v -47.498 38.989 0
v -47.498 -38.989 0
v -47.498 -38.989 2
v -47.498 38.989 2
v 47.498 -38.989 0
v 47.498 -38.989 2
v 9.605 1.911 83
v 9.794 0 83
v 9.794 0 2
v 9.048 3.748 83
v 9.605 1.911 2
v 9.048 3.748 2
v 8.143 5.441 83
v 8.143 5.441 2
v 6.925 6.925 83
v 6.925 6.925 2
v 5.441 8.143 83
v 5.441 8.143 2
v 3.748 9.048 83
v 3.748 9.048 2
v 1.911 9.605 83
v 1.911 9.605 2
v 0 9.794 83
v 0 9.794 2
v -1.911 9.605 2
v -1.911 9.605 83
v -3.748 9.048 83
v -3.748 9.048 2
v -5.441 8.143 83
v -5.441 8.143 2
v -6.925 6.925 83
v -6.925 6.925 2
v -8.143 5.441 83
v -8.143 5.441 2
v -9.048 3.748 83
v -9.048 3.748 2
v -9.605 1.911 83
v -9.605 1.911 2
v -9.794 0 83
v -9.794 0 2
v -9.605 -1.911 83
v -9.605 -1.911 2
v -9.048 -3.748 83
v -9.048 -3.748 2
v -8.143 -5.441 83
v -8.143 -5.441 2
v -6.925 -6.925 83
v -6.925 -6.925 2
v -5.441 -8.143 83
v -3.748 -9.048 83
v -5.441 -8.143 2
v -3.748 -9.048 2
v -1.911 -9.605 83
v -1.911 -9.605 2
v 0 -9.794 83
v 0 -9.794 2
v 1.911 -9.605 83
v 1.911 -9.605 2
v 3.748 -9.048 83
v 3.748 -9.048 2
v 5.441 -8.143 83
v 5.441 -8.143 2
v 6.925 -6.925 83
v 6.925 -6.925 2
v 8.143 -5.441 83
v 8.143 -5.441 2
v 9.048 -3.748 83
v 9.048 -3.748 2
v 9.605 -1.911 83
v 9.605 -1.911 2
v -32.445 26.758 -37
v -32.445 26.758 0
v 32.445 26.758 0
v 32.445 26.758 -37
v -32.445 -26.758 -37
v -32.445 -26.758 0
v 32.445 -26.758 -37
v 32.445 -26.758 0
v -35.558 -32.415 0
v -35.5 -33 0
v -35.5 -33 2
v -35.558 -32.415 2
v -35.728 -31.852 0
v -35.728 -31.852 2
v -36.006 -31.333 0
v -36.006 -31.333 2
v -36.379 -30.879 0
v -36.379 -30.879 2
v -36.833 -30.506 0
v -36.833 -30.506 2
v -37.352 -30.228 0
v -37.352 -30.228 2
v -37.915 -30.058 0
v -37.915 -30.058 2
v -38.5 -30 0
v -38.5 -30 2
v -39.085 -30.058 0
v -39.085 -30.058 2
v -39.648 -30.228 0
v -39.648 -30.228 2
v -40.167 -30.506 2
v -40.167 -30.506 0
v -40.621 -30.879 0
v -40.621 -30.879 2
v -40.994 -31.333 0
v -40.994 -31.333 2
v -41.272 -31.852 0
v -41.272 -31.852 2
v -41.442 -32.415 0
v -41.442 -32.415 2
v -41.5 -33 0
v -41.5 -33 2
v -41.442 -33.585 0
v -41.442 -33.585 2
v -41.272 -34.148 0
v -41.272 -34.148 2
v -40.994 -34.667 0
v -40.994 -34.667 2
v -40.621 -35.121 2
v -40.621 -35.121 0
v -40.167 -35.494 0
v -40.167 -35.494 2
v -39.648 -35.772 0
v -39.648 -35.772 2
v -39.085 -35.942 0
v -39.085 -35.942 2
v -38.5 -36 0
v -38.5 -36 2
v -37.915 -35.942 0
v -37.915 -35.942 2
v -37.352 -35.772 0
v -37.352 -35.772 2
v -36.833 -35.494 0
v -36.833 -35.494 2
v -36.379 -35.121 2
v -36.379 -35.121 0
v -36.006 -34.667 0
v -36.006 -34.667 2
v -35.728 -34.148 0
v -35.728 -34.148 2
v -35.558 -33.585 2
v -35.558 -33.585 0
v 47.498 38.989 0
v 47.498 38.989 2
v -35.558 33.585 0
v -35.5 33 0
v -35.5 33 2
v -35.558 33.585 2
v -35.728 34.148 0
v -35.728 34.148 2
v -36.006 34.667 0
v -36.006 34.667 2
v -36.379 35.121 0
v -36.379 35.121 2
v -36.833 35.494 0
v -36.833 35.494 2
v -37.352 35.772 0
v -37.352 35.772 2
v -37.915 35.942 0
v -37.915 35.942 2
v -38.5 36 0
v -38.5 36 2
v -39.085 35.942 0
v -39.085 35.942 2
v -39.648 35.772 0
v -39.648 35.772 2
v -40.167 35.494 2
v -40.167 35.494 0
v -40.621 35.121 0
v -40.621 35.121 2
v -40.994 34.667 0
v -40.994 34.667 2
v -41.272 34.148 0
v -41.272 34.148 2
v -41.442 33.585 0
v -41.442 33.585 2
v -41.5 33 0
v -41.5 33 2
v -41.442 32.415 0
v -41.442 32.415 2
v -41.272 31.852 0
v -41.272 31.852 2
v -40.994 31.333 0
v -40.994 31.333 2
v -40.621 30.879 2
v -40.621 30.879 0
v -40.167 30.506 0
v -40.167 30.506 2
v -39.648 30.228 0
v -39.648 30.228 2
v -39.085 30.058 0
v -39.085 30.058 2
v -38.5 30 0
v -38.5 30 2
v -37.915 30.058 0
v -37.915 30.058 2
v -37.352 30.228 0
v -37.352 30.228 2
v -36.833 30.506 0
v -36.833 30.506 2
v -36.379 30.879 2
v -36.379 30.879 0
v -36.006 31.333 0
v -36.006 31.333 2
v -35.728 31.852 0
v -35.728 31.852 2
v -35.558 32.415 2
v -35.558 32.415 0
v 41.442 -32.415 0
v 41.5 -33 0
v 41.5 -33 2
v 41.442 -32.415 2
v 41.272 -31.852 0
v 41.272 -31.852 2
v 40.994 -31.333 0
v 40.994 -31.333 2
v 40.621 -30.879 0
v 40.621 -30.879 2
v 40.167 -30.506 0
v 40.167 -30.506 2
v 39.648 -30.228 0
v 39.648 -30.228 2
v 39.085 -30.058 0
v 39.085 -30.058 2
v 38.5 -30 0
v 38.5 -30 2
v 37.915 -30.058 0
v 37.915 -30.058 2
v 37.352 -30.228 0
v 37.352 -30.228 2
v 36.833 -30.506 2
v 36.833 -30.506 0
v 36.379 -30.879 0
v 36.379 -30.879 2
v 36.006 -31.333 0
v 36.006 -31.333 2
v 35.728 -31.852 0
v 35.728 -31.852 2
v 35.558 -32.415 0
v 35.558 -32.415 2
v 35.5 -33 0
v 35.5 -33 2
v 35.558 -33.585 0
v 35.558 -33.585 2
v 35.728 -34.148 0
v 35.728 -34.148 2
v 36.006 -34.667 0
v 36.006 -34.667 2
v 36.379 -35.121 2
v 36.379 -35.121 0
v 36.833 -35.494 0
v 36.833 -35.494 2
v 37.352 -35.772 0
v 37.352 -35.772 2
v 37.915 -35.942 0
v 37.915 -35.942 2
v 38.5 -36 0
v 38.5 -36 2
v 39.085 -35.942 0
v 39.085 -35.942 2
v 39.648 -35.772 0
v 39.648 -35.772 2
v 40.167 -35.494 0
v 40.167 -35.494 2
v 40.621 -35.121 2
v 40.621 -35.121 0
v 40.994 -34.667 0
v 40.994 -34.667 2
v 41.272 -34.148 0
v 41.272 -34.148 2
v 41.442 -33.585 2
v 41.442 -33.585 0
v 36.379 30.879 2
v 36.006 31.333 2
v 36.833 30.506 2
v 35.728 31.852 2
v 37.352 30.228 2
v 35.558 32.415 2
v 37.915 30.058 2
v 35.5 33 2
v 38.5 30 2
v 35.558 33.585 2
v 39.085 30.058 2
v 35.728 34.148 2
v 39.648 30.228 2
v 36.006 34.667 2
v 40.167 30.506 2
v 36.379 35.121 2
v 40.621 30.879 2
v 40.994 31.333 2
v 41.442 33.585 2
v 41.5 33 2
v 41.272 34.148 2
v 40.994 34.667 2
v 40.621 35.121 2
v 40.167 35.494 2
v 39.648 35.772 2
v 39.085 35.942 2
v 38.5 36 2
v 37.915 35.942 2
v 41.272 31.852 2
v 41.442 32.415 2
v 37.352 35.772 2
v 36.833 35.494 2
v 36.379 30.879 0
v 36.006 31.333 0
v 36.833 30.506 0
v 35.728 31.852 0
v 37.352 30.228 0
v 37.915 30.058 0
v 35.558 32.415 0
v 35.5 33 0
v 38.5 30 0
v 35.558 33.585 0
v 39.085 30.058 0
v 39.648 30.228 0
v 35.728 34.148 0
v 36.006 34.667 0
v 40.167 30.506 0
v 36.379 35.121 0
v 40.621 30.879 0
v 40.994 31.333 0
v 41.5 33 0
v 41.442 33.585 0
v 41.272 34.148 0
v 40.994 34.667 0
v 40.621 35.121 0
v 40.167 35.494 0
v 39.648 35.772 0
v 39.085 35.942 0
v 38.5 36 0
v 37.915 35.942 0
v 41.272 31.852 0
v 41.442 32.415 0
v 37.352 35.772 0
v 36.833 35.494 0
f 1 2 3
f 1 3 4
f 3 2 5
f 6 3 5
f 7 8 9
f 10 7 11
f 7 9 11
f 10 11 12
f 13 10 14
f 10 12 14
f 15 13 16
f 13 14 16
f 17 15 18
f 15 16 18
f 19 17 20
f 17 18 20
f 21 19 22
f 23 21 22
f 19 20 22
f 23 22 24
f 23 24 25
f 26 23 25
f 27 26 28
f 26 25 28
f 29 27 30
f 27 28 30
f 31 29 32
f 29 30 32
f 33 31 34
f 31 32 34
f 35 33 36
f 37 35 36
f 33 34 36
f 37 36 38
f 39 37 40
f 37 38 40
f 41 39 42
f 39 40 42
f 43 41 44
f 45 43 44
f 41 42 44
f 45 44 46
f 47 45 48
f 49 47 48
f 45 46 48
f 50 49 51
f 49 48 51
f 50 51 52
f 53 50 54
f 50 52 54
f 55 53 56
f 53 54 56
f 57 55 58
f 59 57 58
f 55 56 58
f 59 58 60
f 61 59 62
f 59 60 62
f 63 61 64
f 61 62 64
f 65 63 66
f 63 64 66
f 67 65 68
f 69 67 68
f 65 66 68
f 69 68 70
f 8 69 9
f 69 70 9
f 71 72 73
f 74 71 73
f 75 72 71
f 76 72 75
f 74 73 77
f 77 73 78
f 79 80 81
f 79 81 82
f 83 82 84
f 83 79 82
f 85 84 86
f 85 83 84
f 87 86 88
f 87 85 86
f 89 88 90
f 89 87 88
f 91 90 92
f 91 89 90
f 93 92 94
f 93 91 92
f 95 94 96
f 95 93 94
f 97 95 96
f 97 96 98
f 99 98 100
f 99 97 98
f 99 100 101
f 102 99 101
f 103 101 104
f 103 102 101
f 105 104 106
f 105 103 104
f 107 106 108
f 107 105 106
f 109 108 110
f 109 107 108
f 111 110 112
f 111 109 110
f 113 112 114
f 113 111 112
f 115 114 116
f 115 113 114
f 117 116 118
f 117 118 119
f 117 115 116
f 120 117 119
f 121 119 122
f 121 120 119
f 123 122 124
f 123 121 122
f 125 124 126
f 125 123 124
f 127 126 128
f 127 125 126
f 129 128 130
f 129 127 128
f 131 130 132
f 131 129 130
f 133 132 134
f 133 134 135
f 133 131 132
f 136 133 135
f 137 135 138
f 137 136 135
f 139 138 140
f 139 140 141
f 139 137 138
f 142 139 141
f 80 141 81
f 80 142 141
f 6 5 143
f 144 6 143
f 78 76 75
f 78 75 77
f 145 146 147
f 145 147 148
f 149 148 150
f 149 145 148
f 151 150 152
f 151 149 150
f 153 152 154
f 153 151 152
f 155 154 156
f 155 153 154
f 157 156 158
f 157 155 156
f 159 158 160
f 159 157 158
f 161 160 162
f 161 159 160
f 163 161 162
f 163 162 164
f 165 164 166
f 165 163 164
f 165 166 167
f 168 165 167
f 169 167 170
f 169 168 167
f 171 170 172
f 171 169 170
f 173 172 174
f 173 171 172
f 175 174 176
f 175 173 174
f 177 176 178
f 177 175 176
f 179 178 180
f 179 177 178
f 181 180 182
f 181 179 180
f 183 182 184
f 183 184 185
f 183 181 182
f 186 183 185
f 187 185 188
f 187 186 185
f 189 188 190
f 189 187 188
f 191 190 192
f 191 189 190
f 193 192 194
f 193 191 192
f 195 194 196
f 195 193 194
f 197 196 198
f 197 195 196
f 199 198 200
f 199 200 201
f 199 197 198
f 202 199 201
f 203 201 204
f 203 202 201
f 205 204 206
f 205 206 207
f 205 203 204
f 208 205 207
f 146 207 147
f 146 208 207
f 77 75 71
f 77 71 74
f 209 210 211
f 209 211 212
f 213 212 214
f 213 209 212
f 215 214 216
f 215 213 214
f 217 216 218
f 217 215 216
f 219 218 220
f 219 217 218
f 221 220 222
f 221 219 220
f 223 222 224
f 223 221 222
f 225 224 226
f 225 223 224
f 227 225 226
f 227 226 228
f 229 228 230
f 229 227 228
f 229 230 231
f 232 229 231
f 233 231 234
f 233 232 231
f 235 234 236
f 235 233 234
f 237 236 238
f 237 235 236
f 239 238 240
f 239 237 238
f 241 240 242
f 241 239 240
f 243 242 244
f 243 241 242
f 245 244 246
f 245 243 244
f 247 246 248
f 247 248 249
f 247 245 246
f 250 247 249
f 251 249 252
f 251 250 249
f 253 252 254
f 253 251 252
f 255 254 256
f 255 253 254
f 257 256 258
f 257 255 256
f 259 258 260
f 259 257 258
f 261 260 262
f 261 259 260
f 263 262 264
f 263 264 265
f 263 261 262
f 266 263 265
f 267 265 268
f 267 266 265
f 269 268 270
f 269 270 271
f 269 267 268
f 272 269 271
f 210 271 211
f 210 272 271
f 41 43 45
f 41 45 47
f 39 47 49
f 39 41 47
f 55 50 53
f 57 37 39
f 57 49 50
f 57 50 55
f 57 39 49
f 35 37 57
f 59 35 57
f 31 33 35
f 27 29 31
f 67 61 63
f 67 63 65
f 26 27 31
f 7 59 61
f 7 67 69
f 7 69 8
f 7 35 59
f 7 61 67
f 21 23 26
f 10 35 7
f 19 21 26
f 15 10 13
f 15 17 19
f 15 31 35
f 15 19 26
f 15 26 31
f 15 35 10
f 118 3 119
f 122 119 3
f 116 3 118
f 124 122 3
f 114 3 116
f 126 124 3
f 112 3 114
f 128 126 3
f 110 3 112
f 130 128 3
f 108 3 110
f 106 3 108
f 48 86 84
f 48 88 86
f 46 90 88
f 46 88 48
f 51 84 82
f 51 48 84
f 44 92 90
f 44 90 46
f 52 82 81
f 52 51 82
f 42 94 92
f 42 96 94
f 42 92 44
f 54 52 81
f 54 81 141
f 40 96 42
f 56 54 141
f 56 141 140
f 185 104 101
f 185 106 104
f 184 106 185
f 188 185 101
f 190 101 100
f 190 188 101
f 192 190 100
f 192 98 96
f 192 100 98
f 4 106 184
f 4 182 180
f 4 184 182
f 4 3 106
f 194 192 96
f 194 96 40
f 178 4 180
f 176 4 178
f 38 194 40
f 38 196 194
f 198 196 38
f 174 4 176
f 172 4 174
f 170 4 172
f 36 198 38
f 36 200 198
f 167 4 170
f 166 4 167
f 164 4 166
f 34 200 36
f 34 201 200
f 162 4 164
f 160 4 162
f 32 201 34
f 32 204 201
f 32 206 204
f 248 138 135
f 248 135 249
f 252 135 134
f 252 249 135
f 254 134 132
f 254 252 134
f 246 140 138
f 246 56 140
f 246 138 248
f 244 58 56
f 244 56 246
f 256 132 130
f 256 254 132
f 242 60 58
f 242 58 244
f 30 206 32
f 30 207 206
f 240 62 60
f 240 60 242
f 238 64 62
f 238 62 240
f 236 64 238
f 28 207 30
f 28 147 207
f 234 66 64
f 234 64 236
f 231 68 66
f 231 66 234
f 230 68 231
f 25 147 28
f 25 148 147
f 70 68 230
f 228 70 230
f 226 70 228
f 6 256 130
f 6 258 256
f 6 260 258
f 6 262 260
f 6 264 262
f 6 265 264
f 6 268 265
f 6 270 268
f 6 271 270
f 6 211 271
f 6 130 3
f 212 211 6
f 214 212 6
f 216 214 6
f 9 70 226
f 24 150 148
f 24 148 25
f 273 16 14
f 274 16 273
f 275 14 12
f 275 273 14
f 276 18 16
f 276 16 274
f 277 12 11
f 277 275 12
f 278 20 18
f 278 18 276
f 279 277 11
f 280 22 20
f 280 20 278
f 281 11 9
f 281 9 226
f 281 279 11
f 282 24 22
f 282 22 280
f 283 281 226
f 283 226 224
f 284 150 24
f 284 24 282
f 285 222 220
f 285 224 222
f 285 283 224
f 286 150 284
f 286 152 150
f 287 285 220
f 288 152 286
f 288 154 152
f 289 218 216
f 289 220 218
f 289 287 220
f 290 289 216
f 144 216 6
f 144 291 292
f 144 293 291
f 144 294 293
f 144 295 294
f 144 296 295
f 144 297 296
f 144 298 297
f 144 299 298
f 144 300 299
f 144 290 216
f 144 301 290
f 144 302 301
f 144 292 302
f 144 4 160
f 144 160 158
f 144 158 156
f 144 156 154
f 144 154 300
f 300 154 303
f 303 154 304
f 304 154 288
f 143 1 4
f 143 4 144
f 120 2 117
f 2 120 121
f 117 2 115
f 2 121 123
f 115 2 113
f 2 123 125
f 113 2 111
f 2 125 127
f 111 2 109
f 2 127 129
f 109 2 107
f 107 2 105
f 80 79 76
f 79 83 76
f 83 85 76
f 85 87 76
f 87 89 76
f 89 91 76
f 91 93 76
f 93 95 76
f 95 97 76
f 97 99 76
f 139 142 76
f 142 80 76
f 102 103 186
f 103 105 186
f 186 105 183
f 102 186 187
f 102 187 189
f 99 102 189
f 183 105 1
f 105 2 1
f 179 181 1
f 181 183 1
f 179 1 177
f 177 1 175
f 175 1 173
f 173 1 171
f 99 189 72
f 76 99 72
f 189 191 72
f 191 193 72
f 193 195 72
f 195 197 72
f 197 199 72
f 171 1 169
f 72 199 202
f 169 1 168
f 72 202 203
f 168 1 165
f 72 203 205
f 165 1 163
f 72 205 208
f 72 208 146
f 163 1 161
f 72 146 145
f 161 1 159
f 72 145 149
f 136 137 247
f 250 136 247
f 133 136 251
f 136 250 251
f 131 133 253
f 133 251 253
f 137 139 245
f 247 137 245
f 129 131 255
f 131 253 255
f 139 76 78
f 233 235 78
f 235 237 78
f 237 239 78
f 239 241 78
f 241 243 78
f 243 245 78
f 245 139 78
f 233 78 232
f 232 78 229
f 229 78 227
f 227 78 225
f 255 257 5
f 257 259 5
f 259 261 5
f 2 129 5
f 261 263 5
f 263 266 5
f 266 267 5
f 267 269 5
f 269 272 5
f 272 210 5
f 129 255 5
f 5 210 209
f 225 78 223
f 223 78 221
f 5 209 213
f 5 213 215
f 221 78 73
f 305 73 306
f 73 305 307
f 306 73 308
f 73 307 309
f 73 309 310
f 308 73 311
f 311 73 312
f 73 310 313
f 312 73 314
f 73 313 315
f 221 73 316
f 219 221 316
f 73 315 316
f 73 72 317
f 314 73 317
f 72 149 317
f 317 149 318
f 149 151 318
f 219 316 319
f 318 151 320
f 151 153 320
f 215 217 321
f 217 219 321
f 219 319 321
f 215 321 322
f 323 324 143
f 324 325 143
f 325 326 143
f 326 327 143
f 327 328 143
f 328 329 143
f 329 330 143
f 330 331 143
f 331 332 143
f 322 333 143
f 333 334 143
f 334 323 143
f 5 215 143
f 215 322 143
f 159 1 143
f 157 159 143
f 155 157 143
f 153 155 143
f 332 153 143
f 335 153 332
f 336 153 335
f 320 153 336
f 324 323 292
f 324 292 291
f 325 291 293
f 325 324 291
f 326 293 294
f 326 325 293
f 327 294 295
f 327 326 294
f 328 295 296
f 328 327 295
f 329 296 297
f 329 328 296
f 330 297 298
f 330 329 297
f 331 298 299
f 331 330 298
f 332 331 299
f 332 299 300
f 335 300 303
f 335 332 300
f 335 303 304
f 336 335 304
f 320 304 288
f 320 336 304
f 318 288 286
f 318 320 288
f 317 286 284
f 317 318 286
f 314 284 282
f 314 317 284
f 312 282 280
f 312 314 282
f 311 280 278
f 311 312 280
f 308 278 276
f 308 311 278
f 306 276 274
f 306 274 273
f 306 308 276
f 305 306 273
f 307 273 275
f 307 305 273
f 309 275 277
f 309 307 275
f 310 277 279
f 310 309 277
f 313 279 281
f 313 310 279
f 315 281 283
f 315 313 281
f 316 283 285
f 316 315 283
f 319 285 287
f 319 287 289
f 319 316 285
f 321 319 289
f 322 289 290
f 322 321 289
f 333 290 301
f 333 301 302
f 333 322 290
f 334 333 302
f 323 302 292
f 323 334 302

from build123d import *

# Parameters (mm, degrees)
F0_W     = 94.996
F0_H     = 77.978
F0_R     = 3
F1_DEPTH = 2
F2_W     = 64.889214
F2_H     = 53.515256
F3_DEPTH = 37
F4_R     = 9.793531
F5_DEPTH = 81


with BuildPart() as f1:
    # F0 (on Top) → F1 (new body)
    with BuildSketch(Plane.XY):
        Rectangle(F0_W, F0_H)
        with Locations((-38.5, -33)):
            Circle(F0_R, mode=Mode.SUBTRACT)
        with Locations((38.5, -33)):
            Circle(F0_R, mode=Mode.SUBTRACT)
        with Locations((-38.5, 33)):
            Circle(F0_R, mode=Mode.SUBTRACT)
        with Locations((38.5, 33)):
            Circle(F0_R, mode=Mode.SUBTRACT)
    extrude(amount=F1_DEPTH)

    # F2 (on face) → F3 (join)
    with BuildSketch(Plane(origin=(0, 0, 0), x_dir=(1, 0, 0), z_dir=(0, 0, -1))):
        Rectangle(F2_W, F2_H)
    extrude(amount=F3_DEPTH)

    # F4 (on face) → F5 (join)
    with BuildSketch(Plane.XY.offset(2)):
        Circle(F4_R)
    extrude(amount=F5_DEPTH)


solid = f1.part
